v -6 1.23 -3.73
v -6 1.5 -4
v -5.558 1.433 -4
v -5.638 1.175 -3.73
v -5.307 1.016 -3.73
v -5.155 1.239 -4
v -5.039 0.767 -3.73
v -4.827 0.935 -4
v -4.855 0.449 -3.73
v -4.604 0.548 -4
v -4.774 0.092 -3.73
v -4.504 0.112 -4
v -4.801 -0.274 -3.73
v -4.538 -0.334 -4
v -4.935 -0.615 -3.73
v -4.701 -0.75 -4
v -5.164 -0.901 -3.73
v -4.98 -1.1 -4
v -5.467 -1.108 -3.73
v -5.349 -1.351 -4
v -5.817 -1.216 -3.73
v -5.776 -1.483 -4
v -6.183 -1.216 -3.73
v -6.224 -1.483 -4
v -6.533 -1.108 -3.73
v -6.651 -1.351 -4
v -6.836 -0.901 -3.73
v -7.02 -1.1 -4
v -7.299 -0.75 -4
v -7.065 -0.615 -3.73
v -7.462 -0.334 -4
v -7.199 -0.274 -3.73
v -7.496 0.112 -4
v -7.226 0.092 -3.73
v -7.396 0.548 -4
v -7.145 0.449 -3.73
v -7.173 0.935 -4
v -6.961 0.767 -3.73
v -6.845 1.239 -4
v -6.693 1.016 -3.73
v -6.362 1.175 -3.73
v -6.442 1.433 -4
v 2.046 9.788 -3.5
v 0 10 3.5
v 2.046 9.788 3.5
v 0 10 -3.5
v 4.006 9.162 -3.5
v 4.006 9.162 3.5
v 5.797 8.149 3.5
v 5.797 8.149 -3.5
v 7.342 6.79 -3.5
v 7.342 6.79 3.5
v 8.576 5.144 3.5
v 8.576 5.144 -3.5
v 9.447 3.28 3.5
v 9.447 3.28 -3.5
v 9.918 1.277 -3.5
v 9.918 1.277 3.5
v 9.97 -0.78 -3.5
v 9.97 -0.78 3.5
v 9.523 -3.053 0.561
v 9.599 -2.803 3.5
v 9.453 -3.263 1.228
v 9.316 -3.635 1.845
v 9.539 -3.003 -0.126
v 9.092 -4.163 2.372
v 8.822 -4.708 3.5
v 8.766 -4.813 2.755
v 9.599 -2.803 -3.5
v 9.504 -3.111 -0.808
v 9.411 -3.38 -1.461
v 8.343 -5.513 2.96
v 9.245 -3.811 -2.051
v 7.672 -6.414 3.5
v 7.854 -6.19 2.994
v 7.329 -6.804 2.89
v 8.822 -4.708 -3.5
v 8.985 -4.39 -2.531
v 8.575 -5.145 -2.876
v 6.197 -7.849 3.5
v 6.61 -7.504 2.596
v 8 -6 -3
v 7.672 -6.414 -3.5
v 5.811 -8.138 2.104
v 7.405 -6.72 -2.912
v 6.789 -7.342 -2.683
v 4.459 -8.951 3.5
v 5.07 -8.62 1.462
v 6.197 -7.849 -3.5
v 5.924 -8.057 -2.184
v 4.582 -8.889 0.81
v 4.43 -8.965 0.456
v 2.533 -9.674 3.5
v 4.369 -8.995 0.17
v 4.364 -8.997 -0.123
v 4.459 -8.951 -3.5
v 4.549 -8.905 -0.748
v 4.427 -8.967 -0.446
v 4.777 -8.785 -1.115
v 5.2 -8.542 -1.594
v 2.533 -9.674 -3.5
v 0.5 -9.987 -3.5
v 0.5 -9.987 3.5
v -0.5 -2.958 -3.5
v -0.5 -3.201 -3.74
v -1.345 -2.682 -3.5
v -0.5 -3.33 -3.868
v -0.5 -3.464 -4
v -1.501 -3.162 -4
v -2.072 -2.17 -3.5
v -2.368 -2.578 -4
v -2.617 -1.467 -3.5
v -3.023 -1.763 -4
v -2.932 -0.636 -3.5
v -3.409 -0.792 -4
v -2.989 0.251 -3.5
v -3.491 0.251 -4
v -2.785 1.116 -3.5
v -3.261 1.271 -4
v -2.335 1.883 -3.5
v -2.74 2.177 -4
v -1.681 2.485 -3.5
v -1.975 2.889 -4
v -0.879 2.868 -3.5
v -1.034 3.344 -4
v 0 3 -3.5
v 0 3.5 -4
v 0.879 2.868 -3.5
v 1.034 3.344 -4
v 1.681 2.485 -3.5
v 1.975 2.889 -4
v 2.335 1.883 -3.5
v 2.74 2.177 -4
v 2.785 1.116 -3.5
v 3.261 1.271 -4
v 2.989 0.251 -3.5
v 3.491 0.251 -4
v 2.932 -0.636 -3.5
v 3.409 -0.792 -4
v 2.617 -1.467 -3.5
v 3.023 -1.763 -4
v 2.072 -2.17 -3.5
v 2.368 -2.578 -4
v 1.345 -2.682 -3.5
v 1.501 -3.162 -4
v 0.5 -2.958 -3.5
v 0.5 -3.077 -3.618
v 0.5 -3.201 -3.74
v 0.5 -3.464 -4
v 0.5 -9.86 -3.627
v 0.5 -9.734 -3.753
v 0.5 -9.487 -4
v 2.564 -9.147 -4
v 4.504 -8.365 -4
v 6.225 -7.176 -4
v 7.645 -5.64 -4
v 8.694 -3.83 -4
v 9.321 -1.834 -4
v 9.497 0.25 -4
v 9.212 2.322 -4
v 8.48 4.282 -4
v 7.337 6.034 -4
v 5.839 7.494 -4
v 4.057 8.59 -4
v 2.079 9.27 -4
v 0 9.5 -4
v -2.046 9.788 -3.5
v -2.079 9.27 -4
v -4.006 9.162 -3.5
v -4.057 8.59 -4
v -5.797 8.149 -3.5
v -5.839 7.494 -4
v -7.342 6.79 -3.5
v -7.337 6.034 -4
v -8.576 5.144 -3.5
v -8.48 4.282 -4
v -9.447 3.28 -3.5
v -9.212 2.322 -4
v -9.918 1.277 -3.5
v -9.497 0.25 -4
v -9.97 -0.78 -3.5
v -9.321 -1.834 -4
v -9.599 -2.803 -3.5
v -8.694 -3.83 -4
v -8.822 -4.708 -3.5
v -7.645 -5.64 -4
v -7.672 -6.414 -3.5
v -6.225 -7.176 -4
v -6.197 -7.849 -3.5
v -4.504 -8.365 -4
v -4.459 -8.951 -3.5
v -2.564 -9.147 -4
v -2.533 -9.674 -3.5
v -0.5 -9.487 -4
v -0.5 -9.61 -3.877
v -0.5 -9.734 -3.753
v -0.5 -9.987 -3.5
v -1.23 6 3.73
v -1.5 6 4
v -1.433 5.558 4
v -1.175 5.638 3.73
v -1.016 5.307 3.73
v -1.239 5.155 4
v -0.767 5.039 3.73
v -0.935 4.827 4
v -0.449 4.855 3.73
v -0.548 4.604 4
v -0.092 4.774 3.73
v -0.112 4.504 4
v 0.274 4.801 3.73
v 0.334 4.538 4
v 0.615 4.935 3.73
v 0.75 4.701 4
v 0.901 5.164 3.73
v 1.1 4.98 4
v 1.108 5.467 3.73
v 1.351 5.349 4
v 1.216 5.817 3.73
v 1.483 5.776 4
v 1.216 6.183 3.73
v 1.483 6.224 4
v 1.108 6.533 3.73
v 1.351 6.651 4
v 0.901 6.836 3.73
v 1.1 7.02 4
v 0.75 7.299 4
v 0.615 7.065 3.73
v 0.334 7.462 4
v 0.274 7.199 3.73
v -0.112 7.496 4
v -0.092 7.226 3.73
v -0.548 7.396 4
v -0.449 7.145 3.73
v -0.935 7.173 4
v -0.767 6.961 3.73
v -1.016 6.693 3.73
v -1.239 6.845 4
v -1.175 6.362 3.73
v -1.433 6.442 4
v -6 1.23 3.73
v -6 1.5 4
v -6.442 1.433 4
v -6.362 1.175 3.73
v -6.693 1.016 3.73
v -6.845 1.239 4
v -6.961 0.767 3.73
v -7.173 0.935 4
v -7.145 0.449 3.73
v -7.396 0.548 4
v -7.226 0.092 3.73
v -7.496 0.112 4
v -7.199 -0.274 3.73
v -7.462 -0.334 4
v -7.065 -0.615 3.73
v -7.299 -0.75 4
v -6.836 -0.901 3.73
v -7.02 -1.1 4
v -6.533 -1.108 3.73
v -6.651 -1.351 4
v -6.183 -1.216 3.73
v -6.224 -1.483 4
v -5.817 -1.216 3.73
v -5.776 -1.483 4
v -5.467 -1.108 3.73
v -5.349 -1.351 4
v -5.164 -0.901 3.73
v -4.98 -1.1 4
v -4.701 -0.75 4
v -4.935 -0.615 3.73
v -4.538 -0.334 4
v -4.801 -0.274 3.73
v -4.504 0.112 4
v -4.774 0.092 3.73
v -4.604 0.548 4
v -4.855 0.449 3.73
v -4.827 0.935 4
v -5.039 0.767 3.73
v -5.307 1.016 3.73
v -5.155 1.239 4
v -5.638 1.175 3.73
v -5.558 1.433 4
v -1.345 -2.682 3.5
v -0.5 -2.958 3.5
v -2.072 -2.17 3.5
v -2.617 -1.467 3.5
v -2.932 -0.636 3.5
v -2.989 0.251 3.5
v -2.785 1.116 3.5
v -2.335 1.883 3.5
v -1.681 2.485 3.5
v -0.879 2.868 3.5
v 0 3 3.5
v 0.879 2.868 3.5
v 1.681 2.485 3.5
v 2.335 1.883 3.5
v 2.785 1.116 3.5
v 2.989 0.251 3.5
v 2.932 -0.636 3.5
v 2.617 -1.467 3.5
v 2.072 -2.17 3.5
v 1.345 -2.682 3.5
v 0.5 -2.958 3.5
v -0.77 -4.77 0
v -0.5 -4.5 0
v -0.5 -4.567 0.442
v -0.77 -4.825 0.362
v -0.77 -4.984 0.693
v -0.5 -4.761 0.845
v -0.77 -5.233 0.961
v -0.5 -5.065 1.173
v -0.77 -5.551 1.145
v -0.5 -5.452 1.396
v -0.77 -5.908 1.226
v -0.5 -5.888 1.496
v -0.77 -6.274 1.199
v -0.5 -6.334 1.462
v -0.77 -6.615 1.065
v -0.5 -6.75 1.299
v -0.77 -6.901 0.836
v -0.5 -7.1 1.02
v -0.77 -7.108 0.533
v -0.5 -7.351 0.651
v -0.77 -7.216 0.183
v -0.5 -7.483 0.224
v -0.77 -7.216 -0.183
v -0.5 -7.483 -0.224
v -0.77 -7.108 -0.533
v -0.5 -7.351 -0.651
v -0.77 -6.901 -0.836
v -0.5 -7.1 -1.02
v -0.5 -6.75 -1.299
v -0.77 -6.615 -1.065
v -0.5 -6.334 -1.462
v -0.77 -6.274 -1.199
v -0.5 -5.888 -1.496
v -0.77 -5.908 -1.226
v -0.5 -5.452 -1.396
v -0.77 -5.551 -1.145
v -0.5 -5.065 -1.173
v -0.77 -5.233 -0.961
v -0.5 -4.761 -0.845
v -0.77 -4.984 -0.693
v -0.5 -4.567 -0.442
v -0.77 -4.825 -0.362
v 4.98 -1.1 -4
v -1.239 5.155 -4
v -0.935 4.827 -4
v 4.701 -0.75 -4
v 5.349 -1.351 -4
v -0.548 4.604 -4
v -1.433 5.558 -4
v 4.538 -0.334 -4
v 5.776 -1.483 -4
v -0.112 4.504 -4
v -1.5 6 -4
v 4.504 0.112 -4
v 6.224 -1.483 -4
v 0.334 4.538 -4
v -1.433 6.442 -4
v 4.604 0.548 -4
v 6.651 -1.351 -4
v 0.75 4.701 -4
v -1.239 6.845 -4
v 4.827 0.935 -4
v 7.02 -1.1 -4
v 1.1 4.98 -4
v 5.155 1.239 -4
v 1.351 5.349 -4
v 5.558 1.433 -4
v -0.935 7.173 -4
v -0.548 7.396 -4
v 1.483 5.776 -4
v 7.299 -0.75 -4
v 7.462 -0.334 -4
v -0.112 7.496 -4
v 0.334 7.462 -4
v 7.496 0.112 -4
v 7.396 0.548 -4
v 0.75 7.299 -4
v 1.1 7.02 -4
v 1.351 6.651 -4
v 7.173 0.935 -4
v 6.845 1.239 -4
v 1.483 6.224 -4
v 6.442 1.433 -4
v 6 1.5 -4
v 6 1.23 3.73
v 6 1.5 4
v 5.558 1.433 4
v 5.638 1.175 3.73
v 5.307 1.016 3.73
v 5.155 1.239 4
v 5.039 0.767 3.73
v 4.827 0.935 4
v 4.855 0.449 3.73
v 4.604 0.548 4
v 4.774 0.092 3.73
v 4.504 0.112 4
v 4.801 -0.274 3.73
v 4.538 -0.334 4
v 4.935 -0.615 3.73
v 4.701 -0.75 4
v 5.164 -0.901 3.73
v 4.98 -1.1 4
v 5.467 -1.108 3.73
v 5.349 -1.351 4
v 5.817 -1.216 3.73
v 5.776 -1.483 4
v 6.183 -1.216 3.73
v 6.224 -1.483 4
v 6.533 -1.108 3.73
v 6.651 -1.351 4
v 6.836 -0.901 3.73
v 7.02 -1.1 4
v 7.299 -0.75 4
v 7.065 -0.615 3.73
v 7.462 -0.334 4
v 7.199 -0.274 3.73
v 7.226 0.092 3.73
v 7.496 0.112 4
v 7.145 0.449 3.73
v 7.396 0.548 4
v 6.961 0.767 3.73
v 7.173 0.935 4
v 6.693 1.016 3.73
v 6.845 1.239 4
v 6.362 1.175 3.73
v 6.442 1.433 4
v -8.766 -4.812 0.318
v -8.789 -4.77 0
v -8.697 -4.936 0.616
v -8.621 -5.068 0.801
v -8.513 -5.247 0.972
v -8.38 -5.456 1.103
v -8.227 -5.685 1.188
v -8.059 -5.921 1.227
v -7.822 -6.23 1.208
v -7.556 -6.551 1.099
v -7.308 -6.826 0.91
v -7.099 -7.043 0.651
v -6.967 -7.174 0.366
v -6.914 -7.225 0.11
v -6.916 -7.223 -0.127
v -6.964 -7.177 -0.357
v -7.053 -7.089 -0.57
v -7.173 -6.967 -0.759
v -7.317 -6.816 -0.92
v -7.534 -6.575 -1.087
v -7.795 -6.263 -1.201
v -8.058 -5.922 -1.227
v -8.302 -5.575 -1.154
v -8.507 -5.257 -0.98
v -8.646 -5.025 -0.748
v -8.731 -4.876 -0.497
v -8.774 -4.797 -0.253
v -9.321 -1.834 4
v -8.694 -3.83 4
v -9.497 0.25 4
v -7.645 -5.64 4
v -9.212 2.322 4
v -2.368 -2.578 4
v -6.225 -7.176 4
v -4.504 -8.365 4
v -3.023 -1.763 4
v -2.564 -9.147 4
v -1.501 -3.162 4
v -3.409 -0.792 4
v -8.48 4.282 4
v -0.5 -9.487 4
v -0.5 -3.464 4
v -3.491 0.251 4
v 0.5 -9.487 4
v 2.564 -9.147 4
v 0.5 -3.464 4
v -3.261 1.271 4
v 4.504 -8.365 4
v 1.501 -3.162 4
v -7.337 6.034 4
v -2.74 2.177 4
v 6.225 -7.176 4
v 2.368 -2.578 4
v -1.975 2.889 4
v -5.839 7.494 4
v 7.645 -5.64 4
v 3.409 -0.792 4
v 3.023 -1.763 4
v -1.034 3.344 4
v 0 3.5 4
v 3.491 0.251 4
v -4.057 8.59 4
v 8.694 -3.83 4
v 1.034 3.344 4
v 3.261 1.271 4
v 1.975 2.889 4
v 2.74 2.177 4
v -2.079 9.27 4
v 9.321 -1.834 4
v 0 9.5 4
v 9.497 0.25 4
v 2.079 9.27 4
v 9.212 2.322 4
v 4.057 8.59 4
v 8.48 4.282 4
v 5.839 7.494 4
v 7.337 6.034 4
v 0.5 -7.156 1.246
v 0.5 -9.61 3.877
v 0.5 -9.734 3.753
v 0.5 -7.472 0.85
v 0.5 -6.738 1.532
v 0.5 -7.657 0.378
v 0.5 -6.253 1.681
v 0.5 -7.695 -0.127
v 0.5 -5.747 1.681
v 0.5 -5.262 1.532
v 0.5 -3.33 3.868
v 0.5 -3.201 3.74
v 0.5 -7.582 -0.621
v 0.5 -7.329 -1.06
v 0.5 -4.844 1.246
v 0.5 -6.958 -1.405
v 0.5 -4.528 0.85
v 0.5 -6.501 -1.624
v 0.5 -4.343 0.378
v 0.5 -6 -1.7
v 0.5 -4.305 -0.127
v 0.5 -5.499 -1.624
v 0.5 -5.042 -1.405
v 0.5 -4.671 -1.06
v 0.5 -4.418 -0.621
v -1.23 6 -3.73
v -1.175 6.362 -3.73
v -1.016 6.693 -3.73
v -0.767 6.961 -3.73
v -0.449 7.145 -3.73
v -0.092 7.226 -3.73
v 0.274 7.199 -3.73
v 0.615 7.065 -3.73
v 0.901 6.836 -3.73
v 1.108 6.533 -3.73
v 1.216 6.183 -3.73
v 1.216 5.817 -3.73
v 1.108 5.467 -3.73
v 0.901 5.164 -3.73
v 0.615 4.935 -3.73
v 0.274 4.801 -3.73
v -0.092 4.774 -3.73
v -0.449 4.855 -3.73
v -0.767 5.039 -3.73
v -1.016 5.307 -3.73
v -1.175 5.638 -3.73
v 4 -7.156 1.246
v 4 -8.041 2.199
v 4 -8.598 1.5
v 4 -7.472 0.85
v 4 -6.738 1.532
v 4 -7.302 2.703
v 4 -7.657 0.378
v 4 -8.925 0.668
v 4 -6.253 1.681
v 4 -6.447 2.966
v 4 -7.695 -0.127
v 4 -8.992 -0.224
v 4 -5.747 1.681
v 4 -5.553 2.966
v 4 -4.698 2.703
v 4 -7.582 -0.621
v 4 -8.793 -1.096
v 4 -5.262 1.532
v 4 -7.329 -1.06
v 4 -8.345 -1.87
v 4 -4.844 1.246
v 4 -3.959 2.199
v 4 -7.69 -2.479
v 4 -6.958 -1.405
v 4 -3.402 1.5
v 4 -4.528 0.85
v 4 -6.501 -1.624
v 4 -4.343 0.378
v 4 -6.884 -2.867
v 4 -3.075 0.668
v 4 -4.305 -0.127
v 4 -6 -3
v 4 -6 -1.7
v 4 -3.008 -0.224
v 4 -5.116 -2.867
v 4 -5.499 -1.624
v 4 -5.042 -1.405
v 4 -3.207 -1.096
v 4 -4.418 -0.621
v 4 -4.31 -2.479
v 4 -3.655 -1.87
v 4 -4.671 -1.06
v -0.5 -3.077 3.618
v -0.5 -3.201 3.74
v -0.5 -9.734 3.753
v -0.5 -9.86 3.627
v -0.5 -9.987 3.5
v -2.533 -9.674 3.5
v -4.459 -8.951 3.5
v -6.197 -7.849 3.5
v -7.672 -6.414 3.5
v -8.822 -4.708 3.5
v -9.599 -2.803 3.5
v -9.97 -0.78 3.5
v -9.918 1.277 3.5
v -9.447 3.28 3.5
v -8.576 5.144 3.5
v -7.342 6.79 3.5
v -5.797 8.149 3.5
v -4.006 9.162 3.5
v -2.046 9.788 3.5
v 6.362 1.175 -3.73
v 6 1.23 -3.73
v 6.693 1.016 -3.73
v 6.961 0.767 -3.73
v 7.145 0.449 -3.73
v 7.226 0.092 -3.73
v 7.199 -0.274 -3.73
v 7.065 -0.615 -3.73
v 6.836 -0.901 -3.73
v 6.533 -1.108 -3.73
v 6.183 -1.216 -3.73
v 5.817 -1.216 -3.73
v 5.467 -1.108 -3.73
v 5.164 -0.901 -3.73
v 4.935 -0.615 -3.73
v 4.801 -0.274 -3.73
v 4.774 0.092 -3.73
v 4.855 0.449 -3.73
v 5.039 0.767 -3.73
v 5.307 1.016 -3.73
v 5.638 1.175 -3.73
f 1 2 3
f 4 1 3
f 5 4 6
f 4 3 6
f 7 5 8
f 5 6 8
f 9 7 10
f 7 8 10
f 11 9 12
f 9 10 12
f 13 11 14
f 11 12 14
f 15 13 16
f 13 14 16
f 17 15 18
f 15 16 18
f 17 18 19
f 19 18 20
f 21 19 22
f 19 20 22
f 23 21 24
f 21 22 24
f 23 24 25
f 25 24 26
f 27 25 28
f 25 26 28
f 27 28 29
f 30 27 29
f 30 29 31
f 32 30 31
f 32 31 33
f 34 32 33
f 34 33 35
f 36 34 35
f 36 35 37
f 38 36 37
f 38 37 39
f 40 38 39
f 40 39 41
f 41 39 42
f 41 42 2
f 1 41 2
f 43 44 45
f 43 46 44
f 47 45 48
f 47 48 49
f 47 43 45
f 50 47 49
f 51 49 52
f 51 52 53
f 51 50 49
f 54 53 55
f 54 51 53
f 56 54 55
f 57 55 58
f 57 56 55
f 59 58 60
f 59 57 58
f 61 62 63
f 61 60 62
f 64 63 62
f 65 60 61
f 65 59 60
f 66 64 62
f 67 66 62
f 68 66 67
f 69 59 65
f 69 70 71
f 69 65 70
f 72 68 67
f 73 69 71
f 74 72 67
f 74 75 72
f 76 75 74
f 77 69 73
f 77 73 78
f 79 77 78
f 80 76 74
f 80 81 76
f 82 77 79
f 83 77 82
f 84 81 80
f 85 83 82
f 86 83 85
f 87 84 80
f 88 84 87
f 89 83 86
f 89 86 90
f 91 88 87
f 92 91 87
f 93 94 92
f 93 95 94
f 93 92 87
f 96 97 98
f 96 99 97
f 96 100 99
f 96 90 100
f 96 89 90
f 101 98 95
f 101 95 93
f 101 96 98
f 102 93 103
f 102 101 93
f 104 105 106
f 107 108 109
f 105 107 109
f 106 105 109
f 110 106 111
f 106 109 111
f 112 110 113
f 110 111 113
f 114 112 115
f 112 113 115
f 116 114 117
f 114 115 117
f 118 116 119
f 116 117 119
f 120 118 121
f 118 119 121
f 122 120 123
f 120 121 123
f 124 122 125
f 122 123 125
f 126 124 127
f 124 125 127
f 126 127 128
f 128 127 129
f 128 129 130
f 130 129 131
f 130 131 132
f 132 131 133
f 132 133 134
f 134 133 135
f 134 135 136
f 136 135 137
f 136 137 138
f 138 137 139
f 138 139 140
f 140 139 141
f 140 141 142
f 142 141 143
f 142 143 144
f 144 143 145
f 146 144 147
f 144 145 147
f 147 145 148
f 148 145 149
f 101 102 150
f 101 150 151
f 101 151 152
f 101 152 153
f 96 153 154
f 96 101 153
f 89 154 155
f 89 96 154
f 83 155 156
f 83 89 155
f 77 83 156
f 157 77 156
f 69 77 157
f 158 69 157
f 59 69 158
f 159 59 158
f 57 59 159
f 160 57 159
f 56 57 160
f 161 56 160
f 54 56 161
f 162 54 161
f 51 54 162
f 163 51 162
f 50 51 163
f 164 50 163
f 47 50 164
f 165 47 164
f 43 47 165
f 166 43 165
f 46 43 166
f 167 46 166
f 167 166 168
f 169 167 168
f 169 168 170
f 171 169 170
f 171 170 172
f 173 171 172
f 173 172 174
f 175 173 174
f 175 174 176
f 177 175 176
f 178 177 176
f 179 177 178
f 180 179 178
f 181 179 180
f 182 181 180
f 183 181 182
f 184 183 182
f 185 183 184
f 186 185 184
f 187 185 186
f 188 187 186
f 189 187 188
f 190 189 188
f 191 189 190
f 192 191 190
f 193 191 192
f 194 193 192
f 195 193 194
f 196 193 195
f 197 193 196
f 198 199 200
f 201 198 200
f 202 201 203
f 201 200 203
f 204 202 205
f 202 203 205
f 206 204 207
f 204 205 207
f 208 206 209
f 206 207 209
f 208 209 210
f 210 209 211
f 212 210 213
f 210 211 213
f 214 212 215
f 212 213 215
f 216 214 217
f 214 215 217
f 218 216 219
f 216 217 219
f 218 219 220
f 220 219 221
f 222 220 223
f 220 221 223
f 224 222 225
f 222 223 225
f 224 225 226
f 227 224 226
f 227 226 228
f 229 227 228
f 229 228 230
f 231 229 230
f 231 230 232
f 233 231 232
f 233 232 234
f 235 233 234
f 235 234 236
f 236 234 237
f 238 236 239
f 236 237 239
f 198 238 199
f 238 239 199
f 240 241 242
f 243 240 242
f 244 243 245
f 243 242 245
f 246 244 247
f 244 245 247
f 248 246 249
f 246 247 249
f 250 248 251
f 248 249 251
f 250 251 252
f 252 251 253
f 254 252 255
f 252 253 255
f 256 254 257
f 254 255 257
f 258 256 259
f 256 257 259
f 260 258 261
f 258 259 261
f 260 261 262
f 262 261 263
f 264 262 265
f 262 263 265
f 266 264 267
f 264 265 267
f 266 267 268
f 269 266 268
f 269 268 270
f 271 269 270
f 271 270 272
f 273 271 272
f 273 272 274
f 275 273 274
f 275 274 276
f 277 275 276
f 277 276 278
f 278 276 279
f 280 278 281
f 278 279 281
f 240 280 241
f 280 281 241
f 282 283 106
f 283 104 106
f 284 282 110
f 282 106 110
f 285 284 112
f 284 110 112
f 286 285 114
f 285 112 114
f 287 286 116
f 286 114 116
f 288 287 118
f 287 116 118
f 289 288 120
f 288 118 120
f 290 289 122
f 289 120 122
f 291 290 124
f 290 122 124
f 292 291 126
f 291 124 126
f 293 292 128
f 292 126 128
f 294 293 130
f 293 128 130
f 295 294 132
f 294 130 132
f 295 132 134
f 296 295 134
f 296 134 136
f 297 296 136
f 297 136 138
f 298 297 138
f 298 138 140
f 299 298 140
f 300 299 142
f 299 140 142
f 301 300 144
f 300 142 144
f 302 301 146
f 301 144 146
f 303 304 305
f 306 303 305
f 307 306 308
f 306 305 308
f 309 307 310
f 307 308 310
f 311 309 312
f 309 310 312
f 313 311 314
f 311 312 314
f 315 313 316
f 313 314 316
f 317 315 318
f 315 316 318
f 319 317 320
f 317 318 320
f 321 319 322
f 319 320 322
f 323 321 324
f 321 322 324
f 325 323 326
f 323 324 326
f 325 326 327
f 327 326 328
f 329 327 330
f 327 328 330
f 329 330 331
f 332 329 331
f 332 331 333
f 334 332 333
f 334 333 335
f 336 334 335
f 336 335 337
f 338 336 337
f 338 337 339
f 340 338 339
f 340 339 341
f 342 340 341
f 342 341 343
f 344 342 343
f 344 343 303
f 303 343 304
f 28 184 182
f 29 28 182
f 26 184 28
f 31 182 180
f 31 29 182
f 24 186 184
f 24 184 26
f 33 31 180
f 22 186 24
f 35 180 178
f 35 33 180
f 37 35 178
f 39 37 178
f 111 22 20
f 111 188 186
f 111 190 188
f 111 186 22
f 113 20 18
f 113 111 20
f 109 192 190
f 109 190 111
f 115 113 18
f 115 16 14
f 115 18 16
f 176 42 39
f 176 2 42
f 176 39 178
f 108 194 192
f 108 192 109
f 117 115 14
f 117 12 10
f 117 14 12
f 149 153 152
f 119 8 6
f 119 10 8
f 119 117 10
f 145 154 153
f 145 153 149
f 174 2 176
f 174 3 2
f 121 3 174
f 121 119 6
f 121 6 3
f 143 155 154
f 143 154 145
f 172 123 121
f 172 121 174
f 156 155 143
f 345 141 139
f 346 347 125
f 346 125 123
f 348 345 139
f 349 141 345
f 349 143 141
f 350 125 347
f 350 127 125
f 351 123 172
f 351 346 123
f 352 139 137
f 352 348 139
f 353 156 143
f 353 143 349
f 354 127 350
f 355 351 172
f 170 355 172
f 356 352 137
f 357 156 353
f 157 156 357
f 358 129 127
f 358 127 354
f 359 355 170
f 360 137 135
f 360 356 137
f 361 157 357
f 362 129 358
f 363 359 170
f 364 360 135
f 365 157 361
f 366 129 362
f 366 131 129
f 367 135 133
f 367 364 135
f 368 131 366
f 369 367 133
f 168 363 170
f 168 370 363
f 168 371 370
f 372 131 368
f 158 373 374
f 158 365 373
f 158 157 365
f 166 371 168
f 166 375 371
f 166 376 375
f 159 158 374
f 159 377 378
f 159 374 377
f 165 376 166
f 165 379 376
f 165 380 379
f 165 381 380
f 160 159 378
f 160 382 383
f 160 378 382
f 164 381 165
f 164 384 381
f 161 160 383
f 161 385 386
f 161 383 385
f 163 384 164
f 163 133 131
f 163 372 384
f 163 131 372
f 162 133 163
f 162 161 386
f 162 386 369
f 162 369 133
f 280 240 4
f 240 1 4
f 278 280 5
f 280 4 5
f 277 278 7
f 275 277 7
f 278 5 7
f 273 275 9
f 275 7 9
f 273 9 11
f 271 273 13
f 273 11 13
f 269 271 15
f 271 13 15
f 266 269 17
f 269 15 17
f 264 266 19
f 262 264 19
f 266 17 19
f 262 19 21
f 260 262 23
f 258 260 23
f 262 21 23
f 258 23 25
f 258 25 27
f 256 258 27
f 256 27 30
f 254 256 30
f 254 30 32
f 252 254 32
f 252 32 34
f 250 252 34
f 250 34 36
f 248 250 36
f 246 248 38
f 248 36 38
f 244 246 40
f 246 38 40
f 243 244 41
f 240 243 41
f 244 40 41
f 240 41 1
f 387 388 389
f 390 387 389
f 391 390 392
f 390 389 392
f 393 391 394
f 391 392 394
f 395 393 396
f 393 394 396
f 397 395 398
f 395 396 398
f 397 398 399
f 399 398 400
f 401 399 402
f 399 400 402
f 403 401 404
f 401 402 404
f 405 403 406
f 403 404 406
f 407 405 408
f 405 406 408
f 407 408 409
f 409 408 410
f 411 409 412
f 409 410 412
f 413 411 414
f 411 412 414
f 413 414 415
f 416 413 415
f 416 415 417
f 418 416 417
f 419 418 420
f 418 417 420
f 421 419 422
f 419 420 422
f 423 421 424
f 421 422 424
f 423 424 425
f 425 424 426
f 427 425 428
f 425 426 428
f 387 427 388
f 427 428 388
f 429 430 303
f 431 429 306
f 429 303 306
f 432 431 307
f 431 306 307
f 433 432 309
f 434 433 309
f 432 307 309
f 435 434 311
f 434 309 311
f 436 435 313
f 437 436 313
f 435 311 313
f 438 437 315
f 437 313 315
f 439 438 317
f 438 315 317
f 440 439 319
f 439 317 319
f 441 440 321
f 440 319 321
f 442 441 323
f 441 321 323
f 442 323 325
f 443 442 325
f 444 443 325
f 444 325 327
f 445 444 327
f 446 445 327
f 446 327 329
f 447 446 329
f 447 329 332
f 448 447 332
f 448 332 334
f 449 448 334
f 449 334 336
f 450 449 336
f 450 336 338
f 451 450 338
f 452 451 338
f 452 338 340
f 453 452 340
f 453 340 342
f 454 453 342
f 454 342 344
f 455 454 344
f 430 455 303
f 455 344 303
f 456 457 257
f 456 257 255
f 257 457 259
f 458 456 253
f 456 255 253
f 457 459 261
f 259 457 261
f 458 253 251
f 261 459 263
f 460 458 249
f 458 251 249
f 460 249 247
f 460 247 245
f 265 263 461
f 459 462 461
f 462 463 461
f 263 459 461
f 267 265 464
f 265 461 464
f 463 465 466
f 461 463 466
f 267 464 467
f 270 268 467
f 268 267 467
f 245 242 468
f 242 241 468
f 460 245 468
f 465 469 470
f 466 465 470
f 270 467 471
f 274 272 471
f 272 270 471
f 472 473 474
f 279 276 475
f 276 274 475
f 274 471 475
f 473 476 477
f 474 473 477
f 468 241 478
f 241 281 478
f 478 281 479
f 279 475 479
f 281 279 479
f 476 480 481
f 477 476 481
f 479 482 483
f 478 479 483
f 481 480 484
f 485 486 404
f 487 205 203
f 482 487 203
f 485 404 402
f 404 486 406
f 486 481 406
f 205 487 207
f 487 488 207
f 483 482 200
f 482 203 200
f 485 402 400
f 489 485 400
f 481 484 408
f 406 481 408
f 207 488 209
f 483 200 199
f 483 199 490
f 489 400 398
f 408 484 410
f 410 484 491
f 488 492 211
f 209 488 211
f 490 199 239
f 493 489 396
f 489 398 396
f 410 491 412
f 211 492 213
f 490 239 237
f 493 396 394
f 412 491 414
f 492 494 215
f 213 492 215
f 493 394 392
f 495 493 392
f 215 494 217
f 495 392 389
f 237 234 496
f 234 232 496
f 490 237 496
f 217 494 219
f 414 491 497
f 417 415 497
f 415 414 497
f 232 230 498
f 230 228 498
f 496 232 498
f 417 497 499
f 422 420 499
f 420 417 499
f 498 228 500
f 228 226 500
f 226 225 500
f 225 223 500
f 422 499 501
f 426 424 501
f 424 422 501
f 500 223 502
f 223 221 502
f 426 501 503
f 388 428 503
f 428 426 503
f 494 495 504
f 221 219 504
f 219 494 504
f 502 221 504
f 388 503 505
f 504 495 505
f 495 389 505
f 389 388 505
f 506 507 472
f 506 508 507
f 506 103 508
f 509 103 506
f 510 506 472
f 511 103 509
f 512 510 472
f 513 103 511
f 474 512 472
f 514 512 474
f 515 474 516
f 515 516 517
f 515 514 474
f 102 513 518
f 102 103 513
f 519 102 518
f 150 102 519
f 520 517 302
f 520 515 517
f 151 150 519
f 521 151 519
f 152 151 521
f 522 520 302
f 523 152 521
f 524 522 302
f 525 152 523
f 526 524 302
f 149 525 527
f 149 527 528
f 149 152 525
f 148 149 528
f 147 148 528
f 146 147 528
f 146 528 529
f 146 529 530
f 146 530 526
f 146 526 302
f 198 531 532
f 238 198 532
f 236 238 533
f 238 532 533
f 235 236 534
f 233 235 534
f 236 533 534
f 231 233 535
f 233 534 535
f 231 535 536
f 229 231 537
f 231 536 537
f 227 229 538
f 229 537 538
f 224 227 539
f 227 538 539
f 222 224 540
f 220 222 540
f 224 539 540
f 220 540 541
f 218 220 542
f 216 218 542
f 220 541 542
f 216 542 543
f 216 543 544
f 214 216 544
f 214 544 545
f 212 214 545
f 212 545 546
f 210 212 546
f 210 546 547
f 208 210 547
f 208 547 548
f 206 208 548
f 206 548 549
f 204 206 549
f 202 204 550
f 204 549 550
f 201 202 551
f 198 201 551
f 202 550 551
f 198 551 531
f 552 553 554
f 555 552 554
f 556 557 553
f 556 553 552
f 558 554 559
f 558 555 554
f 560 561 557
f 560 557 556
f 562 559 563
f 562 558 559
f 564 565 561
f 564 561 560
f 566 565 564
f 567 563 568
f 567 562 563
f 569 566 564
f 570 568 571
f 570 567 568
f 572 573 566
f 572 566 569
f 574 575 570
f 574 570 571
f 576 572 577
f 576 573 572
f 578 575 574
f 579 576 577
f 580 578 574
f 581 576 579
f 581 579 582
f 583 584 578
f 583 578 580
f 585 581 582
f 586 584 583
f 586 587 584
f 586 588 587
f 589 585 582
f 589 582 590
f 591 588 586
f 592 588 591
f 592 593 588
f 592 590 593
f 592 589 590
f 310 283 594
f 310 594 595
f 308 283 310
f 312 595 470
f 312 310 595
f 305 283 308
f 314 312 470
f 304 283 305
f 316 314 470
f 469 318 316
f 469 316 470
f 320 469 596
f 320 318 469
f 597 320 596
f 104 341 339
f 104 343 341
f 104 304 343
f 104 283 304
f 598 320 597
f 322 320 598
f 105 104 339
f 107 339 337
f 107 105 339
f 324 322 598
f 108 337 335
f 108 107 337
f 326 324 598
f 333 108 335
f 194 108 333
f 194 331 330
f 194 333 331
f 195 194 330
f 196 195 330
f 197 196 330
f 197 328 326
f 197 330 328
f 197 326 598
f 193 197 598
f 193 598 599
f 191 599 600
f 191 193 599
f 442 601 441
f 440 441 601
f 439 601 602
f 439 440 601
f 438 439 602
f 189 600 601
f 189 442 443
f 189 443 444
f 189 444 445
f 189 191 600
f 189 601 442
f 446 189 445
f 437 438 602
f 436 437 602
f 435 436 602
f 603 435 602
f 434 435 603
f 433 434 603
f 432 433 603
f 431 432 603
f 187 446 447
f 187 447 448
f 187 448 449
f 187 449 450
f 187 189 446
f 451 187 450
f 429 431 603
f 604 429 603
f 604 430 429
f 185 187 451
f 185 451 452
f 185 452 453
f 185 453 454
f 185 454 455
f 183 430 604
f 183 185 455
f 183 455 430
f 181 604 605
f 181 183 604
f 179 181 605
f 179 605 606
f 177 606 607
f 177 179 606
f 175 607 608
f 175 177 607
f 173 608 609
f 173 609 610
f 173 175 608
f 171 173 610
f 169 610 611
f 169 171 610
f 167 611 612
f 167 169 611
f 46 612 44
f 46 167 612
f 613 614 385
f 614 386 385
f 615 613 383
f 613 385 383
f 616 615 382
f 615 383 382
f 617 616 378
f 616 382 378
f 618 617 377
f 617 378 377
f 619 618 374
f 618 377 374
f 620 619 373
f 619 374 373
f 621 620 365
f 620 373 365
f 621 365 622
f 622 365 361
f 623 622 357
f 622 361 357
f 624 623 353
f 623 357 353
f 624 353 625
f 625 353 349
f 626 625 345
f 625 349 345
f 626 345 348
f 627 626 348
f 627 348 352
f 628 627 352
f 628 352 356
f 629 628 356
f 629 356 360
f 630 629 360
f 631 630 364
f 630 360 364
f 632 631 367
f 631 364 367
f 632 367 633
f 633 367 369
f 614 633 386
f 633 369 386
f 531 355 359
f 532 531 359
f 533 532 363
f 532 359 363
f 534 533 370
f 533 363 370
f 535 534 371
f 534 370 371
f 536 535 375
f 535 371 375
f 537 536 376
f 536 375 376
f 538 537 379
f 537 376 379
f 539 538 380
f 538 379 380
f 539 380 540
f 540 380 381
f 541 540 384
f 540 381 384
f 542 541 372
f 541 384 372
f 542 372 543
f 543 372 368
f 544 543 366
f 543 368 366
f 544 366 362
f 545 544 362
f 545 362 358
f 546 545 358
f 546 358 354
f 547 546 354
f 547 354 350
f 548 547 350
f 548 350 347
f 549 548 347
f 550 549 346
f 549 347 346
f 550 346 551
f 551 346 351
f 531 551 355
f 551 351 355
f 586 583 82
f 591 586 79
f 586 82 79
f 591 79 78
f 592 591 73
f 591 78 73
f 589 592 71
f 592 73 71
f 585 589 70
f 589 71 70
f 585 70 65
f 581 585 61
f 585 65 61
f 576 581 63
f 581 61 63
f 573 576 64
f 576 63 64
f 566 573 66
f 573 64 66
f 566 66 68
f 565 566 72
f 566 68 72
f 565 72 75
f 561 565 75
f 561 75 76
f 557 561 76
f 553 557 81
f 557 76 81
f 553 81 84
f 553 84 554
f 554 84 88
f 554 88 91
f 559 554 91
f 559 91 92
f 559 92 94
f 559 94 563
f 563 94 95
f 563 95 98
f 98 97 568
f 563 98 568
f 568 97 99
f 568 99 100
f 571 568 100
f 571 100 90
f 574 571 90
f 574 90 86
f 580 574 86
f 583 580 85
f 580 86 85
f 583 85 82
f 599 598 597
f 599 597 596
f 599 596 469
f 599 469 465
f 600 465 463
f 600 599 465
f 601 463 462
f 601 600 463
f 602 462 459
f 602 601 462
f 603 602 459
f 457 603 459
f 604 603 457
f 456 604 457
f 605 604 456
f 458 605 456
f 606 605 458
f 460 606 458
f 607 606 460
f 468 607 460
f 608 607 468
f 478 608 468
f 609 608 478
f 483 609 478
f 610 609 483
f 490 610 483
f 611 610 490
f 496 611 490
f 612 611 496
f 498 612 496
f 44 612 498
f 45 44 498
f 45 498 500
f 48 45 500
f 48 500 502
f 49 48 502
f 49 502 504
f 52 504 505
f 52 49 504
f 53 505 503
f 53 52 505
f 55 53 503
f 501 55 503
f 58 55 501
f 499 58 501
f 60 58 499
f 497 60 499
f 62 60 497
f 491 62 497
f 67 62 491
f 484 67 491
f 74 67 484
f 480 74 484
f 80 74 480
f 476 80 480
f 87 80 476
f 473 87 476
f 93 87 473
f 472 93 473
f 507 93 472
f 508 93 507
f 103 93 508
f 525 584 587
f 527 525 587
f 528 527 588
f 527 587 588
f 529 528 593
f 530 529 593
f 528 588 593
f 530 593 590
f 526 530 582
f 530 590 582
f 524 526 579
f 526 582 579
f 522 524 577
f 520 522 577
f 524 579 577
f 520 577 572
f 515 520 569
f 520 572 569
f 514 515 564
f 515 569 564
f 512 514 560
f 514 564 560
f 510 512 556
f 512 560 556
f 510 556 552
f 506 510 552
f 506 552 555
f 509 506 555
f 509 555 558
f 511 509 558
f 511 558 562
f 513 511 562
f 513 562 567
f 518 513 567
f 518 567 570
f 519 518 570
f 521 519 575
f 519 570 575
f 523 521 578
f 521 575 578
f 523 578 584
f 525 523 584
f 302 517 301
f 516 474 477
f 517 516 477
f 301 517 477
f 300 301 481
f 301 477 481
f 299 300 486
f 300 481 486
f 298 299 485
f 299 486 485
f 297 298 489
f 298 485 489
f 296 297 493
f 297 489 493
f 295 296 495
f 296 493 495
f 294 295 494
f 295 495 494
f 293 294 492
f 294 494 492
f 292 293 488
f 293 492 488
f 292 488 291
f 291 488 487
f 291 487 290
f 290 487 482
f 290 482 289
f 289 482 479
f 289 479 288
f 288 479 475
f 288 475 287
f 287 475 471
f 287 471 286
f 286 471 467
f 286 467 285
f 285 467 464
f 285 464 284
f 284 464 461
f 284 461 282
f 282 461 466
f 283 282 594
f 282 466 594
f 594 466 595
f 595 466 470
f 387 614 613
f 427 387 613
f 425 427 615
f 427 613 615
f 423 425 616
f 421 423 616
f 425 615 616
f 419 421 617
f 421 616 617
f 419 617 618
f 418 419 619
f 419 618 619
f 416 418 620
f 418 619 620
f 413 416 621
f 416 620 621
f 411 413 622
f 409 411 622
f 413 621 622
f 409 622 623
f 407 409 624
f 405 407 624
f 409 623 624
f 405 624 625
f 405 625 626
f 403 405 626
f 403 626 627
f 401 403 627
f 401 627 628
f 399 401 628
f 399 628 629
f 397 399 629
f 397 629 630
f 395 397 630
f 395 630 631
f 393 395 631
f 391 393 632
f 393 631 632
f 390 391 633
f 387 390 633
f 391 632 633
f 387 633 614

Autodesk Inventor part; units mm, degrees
sketch "Sketch_14" plane through (0, 0, 0) normal (1, 0, 0) x (0, 1, 0)
  line L0 (0, -4) -> (0, 4)
  line L1 (0, 4) -> (9.5, 4)
  line L2 (9.5, 4) -> (10, 3.5)
  line L3 (10, 3.5) -> (10, -3.5)
  line L4 (10, -3.5) -> (9.5, -4)
  line L5 (9.5, -4) -> (0, -4)
  line L6 (0, -4) -> (0, 4)
revolve "Revolution1" add sketch "Sketch_14" angle 360 about axis through (0, 0, -4) along (0, 0, -1)
sketch "Sketch_15" plane through (0, 0, 0) normal (1, 0, 0) x (0, 1, 0)
  line L0 (0, -4) -> (0, 4)
  line L1 (0, 4) -> (3.5, 4)
  line L2 (3.5, 4) -> (3, 3.5)
  line L3 (3, 3.5) -> (3, -3.5)
  line L4 (3, -3.5) -> (3.5, -4)
  line L5 (3.5, -4) -> (0, -4)
  line L6 (0, -4) -> (0, 4)
revolve "Revolution2" cut sketch "Sketch_15" angle 360 about axis through (0, 0, -4) along (0, 0, -1)
sketch "Sketch_16" plane through (0, 0, 0) normal (0, 0, 1) x (1, 0, 0)
  arc A0 (-0.5, -10.9886) -> (0.5, -10.9886) centre (0, 0) ccw
  line L0 (0.5, -10.9886) -> (0.5, 0)
  line L1 (0.5, 0) -> (-0.5, 0)
  line L2 (-0.5, 0) -> (-0.5, -10.9886)
extrude "Extrusion1" cut sketch "Sketch_16" along normal mid plane 8
sketch "Sketch_18" plane through (6, 0, 0) normal (1, 0, 0) x (0, 0, -1)
  line L0 (4, 0) -> (-4, 0)
  line L1 (-4, 0) -> (-4, 1.5)
  line L2 (-4, 1.5) -> (-3.7295, 1.2295)
  line L3 (-3.7295, 1.2295) -> (3.7295, 1.2295)
  line L4 (3.7295, 1.2295) -> (4, 1.5)
  line L5 (4, 1.5) -> (4, 0)
  line L6 (4, 0) -> (-4, 0)
revolve "Revolution3" cut sketch "Sketch_18" angle 360 about axis through (6, 0, -4) along (0, 0, -1)
thread "Thread1" size "M3x0.5" class "6H" standard "ISO Metric profile" full length
sketch "Sketch_20" plane through (-6, 0, 0) normal (1, 0, 0) x (0, 0, -1)
  line L0 (4, 0) -> (-4, 0)
  line L1 (-4, 0) -> (-4, 1.5)
  line L2 (-4, 1.5) -> (-3.7295, 1.2295)
  line L3 (-3.7295, 1.2295) -> (3.7295, 1.2295)
  line L4 (3.7295, 1.2295) -> (4, 1.5)
  line L5 (4, 1.5) -> (4, 0)
  line L6 (4, 0) -> (-4, 0)
revolve "Revolution4" cut sketch "Sketch_20" angle 360 about axis through (-6, 0, -4) along (0, 0, -1)
thread "Thread2" size "M3x0.5" class "6H" standard "ISO Metric profile" full length
sketch "Sketch_22" plane through (0, 6, 0) normal (0, 1, 0) x (1, 0, 0)
  line L0 (0, 4) -> (0, -4)
  line L1 (0, -4) -> (-1.5, -4)
  line L2 (-1.5, -4) -> (-1.2295, -3.7295)
  line L3 (-1.2295, -3.7295) -> (-1.2295, 3.7295)
  line L4 (-1.2295, 3.7295) -> (-1.5, 4)
  line L5 (-1.5, 4) -> (0, 4)
  line L6 (0, 4) -> (0, -4)
revolve "Revolution5" cut sketch "Sketch_22" angle 360 about axis through (0, 6, -4) along (0, 0, -1)
thread "Thread3" size "M3x0.5" class "6H" standard "ISO Metric profile" full length
sketch "Sketch_23" plane through (0, -6, 0) normal (0, 1, 0) x (1, 0, 0)
  line L0 (10, 0) -> (0, 0)
  line L1 (0, 0) -> (0, 1.7)
  line L2 (0, 1.7) -> (4, 1.7)
  line L3 (4, 1.7) -> (4, 3)
  line L4 (4, 3) -> (10, 3)
  line L5 (10, 3) -> (10, 0)
  line L6 (10, 0) -> (0, 0)
revolve "Revolution6" cut sketch "Sketch_23" angle 360 about axis through (10, -6, 0) along (1, 0, 0)
sketch "Sketch_25" plane through (0, 0, 0) normal (0, 0, 1) x (1, 0, 0)
  line L0 (-0.5, -6) -> (-8.9303, -6)
  line L1 (-8.9303, -6) -> (-8.9303, -4.7705)
  line L2 (-8.9303, -4.7705) -> (-0.7705, -4.7705)
  line L3 (-0.7705, -4.7705) -> (-0.5, -4.5)
  line L4 (-0.5, -4.5) -> (-0.5, -6)
  line L5 (-0.5, -6) -> (-8.9303, -6)
revolve "Revolution7" cut sketch "Sketch_25" angle 360 about axis through (-0.5, -6, 0) along (1, 0, 0)
thread "Thread4" size "M3x0.5" class "6H" standard "ISO Metric profile" length 8.1598
ref_plane "to_bolt_XY" through (4, -6, 0) normal (1, 0, 0) x (0, 0, -1)
ref_plane "to_bolt_YZ" through (4, -6, 0) normal (0, 0, -1) x (0, 1, 0)
ref_plane "to_bolt_ZX" through (4, -6, 0) normal (0, 1, 0) x (1, 0, 0)
properties part number "SCSTR6-8b" material "鋼、炭素鋼"
